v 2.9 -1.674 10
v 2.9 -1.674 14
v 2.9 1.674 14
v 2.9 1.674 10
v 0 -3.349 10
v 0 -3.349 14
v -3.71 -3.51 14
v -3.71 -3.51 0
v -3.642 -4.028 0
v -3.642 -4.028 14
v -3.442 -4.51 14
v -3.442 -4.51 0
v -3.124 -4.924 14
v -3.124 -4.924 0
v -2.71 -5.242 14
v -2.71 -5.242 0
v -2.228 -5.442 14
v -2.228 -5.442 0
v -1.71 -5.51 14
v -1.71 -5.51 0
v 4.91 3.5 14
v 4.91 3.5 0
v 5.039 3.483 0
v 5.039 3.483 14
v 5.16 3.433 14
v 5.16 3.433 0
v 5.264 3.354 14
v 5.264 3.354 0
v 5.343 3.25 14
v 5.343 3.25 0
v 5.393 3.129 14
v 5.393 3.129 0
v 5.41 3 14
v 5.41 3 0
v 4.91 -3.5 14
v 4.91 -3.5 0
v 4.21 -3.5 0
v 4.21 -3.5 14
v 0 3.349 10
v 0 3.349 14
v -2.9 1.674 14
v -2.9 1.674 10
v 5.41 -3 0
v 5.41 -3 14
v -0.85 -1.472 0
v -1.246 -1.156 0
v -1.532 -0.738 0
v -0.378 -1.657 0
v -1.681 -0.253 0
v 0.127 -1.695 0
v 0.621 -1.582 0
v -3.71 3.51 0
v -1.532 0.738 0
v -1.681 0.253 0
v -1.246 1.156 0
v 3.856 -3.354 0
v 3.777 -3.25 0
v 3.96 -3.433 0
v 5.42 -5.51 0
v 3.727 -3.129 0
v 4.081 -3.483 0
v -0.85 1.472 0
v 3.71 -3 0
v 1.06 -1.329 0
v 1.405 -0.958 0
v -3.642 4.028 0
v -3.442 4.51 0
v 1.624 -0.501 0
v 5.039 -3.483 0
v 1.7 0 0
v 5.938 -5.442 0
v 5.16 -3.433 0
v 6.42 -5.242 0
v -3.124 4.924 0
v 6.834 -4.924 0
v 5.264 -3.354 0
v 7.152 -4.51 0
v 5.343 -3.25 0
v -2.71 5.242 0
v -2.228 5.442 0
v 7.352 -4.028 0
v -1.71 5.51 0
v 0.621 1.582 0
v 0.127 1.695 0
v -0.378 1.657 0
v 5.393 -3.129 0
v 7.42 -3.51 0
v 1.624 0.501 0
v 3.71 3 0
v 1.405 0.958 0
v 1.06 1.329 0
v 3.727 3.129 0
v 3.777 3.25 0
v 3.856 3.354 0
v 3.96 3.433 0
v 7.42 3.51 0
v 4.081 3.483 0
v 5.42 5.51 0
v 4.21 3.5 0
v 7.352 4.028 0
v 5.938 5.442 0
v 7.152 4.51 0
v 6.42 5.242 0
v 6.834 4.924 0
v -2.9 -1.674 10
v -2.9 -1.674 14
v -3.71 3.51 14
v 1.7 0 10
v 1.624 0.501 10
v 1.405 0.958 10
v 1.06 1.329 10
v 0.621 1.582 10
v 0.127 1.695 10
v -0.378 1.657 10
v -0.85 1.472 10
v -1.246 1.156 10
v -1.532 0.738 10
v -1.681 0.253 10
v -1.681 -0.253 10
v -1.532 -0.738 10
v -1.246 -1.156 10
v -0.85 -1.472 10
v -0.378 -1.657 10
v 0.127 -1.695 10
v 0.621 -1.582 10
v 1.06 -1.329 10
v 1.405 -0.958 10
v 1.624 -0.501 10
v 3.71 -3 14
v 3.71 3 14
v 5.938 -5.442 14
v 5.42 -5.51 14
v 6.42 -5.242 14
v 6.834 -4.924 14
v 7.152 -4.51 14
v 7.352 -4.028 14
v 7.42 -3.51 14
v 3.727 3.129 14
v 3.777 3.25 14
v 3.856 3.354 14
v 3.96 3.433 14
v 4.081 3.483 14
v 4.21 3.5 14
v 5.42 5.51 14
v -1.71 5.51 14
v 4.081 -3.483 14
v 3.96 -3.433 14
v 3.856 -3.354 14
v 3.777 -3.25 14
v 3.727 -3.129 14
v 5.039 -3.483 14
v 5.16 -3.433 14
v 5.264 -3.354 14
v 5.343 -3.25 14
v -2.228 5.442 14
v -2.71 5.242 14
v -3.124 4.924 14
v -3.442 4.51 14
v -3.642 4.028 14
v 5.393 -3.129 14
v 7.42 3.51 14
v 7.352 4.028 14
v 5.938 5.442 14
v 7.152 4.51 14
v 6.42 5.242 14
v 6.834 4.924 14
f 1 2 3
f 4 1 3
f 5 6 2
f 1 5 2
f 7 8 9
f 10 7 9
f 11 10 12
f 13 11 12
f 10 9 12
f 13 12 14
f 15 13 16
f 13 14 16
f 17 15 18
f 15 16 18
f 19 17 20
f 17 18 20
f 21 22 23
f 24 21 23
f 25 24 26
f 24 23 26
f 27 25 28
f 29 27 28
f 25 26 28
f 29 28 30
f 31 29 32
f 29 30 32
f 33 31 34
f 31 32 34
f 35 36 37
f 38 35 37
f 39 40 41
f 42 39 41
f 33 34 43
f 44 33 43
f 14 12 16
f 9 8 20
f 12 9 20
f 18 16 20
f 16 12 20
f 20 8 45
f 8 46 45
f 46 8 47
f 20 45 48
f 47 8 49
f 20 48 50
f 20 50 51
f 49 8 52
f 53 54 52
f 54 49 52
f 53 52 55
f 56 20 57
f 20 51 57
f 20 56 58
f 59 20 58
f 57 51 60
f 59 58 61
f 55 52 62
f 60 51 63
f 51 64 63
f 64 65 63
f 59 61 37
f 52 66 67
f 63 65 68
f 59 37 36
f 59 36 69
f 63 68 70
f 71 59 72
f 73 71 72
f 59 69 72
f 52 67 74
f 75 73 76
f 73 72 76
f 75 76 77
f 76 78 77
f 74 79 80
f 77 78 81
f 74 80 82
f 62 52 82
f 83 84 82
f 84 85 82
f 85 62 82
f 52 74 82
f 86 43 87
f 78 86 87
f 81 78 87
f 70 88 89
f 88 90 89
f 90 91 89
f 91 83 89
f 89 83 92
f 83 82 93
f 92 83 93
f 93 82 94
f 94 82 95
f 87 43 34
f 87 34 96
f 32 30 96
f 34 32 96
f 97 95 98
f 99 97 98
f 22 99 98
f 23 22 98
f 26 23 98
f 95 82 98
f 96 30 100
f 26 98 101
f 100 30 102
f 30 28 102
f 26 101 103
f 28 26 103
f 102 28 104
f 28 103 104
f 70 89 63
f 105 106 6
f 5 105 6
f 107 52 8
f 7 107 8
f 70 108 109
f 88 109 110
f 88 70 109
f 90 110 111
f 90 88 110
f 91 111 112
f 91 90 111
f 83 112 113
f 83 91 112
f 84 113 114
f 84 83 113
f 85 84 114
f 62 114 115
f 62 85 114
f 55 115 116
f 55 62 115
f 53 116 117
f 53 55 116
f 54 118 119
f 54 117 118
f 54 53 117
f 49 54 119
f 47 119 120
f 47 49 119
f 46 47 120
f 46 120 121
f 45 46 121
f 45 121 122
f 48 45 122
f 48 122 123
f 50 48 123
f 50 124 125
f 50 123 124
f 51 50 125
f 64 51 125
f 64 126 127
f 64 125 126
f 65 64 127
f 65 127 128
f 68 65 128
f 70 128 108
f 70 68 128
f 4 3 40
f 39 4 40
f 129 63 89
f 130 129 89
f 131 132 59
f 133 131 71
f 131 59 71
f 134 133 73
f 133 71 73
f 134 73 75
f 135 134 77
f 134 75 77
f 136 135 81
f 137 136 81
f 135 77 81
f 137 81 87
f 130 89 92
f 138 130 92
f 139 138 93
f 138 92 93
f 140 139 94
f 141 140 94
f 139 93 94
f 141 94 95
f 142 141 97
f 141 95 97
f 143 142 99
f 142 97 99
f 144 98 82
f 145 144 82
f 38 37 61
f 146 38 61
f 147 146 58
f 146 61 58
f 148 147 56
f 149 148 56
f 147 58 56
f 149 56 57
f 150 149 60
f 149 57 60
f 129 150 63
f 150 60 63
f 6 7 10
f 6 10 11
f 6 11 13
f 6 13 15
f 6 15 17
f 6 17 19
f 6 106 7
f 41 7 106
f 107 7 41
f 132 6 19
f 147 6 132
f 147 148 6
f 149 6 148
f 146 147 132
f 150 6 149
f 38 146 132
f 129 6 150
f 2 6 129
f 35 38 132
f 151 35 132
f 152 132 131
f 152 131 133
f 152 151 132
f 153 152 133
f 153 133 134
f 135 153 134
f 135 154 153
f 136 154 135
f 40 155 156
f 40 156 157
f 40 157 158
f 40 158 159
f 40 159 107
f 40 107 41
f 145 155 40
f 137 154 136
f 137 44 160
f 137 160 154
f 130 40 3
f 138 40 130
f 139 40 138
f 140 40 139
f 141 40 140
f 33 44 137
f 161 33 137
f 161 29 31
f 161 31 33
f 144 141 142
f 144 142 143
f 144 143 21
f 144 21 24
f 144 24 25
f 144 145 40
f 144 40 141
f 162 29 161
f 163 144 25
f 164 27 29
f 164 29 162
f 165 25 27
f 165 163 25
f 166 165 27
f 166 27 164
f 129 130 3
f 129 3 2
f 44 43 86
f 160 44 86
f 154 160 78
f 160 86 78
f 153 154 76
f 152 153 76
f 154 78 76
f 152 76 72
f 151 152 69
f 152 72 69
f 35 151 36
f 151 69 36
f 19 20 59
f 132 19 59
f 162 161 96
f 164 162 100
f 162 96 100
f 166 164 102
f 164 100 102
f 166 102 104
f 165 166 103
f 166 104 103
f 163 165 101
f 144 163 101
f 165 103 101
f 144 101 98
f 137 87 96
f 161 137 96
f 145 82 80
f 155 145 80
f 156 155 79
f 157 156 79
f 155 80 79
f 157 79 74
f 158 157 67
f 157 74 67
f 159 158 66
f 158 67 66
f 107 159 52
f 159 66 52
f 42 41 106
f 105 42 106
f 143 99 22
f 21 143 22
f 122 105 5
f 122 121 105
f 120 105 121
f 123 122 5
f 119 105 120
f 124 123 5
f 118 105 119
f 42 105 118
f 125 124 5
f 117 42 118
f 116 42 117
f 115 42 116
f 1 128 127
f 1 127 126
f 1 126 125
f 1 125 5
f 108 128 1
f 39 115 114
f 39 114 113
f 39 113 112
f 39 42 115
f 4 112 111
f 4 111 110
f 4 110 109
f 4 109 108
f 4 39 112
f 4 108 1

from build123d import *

# Parameters (mm, degrees)
SKETCH1_R           = 1.7
BOSS_EXTRUDE1_DEPTH = 14
CUT_EXTRUDE1_DEPTH  = 4


with BuildPart() as part:
    # Sketch1 → Boss-Extrude1 (new body)
    with BuildSketch(Plane.XY):
        with BuildLine():
            Line((5.42, 5.51), (-1.71, 5.51))
            ThreePointArc((-1.71, 5.51), (-3.124213562, 4.924213562), (-3.71, 3.51))
            Line((-3.71, 3.51), (-3.71, -3.51))
            ThreePointArc((-3.71, -3.51), (-3.124213562, -4.924213562), (-1.71, -5.51))
            Line((-1.71, -5.51), (5.42, -5.51))
            ThreePointArc((5.42, -5.51), (6.834213562, -4.924213562), (7.42, -3.51))
            Line((7.42, -3.51), (7.42, 3.51))
            ThreePointArc((7.42, 3.51), (6.834213562, 4.924213562), (5.42, 5.51))
        make_face()
        Circle(SKETCH1_R, mode=Mode.SUBTRACT)
        with BuildLine():
            Line((4.21, 3.5), (4.91, 3.5))
            ThreePointArc((4.91, 3.5), (5.263553391, 3.353553391), (5.41, 3))
            Line((5.41, 3), (5.41, -3))
            ThreePointArc((5.41, -3), (5.263553391, -3.353553391), (4.91, -3.5))
            Line((4.91, -3.5), (4.21, -3.5))
            ThreePointArc((4.21, -3.5), (3.856446609, -3.353553391), (3.71, -3))
            Line((3.71, -3), (3.71, 3))
            ThreePointArc((3.71, 3), (3.856446609, 3.353553391), (4.21, 3.5))
        make_face(mode=Mode.SUBTRACT)
    extrude(amount=BOSS_EXTRUDE1_DEPTH)

    # Sketch2 → Cut-Extrude1 (cut)
    with BuildSketch(Plane.XY.offset(14)):
        Polygon((0, 3.348631561), (-2.9, 1.674315781), (-2.9, -1.674315781), (0, -3.348631561), (2.9, -1.674315781), (2.9, 1.674315781), align=None)
    extrude(amount=-CUT_EXTRUDE1_DEPTH, mode=Mode.SUBTRACT)


solid = part.part
